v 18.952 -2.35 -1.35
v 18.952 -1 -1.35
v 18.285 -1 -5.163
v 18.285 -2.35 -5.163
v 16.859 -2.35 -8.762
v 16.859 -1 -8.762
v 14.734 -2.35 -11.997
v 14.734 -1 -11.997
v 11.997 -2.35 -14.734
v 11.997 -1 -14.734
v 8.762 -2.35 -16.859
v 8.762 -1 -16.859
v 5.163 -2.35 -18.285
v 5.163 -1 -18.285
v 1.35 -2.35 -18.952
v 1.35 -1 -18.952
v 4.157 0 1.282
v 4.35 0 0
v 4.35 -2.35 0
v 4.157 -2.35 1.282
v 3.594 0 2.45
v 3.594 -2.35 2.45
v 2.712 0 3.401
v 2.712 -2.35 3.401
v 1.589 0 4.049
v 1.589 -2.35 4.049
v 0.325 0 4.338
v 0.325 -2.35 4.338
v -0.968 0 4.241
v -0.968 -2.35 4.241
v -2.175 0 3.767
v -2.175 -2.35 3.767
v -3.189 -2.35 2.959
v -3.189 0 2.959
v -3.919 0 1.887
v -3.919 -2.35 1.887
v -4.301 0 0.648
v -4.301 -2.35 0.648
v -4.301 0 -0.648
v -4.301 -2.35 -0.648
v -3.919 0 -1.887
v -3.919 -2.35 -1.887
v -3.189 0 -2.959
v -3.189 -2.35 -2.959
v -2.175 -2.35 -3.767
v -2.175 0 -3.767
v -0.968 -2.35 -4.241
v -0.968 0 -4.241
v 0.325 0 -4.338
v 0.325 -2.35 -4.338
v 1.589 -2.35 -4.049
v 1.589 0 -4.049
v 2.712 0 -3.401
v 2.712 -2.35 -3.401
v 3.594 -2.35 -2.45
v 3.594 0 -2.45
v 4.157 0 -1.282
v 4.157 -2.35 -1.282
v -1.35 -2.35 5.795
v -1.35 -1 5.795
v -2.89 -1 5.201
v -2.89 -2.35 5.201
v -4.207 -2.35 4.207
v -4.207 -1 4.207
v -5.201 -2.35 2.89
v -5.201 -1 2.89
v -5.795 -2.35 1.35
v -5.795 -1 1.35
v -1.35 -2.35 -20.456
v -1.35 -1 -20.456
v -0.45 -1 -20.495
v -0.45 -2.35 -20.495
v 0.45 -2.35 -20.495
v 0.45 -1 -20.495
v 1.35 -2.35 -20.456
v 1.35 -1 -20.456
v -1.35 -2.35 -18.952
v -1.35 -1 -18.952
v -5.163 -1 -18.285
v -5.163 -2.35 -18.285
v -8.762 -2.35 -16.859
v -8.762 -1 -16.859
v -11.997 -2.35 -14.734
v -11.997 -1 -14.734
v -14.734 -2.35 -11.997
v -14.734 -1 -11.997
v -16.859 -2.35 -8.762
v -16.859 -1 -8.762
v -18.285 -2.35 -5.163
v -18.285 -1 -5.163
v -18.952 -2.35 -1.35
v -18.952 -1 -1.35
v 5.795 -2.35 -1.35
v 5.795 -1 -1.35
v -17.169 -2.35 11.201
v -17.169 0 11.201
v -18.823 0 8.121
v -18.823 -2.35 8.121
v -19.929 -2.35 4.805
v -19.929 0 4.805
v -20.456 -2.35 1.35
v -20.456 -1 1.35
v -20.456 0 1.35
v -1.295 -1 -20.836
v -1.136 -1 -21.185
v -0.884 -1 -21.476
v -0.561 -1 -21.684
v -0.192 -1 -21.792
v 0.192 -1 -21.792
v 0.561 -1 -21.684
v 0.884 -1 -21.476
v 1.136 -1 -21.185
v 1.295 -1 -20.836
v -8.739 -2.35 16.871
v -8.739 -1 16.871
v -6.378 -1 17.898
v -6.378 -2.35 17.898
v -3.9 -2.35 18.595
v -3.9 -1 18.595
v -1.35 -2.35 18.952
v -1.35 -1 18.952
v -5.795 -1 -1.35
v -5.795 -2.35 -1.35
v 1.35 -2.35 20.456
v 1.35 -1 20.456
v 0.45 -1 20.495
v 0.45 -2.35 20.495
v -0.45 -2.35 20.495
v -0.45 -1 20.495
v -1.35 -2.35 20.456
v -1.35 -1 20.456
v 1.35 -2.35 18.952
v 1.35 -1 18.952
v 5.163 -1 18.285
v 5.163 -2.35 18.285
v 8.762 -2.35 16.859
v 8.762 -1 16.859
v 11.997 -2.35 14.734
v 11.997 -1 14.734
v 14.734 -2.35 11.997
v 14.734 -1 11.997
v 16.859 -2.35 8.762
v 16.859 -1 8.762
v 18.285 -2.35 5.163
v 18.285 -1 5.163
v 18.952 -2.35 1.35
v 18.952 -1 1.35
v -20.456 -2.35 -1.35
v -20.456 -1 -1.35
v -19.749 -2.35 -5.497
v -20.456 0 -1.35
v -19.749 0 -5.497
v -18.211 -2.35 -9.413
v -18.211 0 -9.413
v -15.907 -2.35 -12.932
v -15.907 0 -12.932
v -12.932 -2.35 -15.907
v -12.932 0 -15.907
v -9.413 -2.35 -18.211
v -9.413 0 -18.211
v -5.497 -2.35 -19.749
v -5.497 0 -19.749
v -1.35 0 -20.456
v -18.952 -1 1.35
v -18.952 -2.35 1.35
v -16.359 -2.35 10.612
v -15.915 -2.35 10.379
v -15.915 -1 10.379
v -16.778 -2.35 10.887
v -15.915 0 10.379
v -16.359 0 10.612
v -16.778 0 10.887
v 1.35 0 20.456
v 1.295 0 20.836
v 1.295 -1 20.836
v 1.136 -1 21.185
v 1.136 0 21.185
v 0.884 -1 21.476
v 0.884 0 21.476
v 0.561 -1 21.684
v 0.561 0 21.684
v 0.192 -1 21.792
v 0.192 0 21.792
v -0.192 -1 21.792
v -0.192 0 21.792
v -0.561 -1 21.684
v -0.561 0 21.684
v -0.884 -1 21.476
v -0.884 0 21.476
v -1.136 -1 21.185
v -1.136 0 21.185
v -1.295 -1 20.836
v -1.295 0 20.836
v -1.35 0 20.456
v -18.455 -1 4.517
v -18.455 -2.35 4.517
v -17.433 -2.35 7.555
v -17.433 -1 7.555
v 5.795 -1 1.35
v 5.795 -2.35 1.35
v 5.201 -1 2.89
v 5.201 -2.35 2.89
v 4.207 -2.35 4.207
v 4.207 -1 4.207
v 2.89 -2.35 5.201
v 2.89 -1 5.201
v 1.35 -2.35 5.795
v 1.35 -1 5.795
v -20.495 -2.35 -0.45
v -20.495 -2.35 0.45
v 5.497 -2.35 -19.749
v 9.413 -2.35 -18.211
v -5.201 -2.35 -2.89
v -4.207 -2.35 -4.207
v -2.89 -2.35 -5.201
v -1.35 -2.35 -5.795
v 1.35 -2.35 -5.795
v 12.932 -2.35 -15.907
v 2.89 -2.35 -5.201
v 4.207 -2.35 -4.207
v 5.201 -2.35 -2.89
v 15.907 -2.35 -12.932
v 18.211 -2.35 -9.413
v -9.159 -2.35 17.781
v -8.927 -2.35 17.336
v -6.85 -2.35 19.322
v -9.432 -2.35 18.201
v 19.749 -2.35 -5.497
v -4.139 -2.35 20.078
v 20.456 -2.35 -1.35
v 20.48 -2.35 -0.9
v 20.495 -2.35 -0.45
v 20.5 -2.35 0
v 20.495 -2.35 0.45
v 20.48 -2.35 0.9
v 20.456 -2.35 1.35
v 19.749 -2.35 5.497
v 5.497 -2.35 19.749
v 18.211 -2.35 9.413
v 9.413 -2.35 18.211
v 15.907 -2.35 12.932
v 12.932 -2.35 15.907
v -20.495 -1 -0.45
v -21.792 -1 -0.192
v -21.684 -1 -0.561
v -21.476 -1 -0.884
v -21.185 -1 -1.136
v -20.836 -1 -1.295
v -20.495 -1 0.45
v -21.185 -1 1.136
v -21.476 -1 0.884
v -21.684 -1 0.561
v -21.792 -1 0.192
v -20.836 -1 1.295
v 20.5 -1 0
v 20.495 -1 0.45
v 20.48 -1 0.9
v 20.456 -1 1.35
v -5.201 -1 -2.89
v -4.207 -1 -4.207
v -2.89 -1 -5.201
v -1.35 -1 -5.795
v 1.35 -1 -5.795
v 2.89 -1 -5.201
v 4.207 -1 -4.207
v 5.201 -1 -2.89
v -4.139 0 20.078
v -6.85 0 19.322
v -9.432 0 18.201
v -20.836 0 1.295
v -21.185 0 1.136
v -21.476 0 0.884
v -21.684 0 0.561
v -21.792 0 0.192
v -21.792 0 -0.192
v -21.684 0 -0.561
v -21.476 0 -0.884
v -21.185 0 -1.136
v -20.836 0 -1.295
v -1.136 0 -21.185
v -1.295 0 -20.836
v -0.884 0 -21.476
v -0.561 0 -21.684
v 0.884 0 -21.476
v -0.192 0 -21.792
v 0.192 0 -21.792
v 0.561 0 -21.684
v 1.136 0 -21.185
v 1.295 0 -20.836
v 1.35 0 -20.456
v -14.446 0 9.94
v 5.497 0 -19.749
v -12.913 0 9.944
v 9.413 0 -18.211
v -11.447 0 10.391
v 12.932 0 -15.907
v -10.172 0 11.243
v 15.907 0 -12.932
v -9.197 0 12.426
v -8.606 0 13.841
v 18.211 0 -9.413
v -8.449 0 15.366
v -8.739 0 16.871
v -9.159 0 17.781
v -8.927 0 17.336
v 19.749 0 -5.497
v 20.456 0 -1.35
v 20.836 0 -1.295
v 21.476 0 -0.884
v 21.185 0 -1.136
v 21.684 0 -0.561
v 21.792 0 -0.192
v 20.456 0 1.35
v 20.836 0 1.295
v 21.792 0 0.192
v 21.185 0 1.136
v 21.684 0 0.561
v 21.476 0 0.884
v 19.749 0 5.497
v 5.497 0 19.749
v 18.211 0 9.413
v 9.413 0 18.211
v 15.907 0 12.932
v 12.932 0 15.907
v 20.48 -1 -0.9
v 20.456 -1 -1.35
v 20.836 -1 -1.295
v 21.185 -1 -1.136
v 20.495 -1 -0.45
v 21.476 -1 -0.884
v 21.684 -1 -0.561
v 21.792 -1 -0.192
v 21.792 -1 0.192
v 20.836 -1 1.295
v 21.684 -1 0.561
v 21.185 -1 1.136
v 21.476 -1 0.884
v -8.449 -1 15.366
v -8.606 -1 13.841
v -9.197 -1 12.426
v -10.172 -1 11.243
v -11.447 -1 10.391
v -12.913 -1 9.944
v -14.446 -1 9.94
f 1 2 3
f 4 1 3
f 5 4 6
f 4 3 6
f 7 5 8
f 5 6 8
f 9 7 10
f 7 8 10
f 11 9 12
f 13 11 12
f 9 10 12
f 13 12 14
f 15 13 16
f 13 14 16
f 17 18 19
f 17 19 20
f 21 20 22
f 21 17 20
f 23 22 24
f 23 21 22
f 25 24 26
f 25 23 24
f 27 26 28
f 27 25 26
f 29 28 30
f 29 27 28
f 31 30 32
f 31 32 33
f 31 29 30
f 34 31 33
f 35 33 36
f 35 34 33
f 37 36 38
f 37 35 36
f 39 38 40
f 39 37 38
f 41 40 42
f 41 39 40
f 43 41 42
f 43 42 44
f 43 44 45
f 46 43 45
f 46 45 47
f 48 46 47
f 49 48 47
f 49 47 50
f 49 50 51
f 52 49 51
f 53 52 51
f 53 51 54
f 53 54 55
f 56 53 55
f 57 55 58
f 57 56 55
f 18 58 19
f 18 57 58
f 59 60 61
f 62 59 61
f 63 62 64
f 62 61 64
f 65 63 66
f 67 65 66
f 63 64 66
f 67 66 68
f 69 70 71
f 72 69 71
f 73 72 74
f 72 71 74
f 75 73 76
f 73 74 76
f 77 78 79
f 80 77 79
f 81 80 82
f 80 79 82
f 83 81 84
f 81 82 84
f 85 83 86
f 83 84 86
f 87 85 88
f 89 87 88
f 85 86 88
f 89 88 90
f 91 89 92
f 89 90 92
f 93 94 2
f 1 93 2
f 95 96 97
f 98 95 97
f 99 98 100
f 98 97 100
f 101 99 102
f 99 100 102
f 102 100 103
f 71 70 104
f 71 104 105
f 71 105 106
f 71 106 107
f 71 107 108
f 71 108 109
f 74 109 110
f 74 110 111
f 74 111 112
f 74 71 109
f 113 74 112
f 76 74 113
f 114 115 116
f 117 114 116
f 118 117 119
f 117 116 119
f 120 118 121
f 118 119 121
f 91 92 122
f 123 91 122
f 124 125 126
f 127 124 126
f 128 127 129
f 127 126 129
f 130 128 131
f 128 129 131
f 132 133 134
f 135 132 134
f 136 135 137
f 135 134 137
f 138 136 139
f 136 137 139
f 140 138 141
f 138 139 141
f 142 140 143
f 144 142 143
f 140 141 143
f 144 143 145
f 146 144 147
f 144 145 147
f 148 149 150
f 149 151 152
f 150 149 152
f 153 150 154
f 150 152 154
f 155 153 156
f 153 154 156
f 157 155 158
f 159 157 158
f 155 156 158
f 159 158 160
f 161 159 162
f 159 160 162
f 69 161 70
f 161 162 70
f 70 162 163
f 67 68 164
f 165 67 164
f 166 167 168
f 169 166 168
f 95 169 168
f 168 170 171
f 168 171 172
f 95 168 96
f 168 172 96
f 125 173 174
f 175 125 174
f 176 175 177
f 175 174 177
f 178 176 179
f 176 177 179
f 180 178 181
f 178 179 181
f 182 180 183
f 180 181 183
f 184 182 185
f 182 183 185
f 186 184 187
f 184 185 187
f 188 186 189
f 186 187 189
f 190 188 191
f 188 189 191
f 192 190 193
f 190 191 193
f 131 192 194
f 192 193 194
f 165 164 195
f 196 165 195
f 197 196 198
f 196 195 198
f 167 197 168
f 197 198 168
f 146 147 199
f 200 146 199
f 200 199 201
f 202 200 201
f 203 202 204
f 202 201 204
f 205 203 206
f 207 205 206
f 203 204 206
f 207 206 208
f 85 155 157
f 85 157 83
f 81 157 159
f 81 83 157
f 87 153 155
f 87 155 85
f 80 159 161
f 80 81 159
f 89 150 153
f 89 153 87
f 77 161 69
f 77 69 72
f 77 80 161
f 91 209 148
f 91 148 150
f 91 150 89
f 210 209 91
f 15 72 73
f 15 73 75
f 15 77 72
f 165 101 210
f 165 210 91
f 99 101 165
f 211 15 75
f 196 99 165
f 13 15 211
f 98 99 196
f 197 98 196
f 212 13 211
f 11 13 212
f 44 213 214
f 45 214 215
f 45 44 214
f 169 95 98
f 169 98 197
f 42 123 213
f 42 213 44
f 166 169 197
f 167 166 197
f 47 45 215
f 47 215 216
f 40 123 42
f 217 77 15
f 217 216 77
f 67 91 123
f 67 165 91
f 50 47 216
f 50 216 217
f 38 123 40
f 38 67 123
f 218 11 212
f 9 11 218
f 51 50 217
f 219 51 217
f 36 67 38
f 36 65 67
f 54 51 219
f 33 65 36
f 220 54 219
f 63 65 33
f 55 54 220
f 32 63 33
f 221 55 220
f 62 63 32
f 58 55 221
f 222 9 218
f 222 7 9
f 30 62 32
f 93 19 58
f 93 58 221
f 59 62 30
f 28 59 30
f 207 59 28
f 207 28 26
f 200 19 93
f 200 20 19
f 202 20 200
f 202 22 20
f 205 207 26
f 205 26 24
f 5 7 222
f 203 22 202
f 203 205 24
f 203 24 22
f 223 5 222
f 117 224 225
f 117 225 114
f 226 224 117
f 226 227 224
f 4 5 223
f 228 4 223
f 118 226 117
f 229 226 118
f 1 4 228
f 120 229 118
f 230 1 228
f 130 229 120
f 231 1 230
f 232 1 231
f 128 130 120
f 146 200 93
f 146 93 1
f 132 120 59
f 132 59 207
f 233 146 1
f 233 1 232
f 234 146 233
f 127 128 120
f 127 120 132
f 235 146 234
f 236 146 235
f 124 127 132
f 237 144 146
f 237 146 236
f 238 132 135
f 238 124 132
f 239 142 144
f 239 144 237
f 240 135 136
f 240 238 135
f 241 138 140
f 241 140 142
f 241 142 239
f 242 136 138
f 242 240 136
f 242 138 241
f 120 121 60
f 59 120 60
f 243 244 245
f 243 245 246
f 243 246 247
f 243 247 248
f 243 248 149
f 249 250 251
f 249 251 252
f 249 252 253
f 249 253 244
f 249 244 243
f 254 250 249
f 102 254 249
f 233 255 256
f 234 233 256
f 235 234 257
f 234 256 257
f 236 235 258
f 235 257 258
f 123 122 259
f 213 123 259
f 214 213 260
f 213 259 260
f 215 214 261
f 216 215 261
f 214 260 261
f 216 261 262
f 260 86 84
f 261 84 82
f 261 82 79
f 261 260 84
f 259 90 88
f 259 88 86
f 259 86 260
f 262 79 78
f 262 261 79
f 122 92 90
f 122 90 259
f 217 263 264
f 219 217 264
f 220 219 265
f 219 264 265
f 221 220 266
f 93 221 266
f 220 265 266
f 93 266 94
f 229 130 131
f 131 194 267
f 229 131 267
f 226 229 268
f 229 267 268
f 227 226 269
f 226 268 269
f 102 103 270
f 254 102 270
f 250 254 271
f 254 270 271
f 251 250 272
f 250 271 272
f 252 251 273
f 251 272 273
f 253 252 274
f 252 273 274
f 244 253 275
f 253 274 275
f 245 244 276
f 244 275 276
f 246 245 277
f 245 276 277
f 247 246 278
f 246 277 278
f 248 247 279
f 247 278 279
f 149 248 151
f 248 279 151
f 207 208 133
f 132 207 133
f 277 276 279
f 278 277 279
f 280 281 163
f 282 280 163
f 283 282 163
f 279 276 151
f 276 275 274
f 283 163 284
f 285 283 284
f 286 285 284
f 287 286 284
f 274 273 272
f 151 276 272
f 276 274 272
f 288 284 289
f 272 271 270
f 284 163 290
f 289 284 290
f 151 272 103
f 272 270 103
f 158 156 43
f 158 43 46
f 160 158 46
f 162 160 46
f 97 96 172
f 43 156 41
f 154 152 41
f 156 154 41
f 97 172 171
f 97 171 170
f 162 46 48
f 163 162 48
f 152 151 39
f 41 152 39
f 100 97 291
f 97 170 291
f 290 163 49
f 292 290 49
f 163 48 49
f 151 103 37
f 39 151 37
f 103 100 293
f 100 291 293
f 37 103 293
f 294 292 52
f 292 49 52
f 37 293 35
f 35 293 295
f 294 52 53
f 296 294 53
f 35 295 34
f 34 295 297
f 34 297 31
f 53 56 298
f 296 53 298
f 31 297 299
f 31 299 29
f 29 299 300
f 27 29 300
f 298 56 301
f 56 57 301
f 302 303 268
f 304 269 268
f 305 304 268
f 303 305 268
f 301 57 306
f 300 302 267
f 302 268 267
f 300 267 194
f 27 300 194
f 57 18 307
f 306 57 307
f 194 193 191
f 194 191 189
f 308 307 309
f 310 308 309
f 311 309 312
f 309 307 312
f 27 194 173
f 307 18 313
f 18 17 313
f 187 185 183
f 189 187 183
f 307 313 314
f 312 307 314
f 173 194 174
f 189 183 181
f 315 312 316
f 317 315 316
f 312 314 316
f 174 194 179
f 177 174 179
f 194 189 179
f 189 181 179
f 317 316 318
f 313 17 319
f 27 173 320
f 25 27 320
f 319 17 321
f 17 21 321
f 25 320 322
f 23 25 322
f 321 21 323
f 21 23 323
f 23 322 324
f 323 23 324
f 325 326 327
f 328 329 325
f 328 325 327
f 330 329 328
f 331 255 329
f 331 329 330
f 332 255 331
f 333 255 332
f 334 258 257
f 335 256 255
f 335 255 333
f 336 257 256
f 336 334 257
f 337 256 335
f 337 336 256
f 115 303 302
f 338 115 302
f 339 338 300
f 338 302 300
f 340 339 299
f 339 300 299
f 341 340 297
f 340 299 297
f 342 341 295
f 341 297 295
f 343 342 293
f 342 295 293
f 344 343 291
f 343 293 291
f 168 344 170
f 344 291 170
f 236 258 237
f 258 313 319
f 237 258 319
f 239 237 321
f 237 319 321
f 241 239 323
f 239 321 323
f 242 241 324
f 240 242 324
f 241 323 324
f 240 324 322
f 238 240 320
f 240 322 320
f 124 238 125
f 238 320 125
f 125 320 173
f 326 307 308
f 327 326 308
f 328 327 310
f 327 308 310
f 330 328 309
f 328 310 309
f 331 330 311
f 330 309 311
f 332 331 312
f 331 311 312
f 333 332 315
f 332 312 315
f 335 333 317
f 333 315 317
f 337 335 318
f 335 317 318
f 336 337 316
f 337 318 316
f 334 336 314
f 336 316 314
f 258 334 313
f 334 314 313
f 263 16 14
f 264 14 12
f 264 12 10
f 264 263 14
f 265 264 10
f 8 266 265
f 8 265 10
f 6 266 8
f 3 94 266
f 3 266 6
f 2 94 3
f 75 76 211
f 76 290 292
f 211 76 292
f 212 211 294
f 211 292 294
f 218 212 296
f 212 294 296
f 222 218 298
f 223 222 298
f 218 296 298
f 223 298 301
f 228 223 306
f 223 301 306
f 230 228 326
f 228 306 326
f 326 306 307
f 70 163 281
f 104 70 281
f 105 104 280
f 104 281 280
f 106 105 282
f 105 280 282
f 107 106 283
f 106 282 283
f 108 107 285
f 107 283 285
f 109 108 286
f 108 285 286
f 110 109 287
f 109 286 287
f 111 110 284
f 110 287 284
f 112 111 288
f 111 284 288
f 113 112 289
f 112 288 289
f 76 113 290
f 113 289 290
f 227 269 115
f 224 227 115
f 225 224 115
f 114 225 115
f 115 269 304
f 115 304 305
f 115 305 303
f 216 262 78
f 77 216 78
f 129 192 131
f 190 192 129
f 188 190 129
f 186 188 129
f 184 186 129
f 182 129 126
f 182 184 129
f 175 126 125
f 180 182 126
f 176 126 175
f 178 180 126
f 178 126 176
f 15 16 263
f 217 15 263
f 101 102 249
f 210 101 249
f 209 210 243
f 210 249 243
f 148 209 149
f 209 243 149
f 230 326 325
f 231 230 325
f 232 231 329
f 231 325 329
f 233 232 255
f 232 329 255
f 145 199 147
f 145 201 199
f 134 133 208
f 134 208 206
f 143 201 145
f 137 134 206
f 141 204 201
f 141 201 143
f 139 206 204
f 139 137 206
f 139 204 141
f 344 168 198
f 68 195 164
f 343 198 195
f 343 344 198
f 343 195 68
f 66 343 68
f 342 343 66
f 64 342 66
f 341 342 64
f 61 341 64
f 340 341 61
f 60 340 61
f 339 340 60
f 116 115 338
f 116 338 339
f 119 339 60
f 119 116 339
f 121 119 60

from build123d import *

# Parameters (mm, degrees)
F0_R     = 4.35
F1_DEPTH = 2.35
F2_DEPTH = 1
F3_DEPTH = 25


# Not quite as in the source:
# - a feature names something its author has since deleted; it is built from what else it names


with BuildPart() as f1:
    # F0 (on Front) → F1 (new body)
    with BuildSketch(Plane.XZ):
        with BuildLine():
            ThreePointArc((18.9519787885, 1.35), (18.9879909019, 0.6754269088), (19, 0))
            ThreePointArc((19, 0), (18.9879909019, -0.6754269088), (18.9519787885, -1.35))
            ThreePointArc((18.9519787885, -1.35), (13.4350288425, -13.4350288425), (1.35, -18.9519787885))
            ThreePointArc((1.35, -18.9519787885), (0, -19), (-1.35, -18.9519787885))
            ThreePointArc((-1.35, -18.9519787885), (-13.4350288425, -13.4350288425), (-18.9519787885, -1.35))
            ThreePointArc((-18.9519787885, -1.35), (-19, 0), (-18.9519787885, 1.35))
            ThreePointArc((-18.9519787885, 1.35), (-18.0084373125, 6.0577376603), (-15.9148967645, 10.378634832))
            ThreePointArc((-15.9148967645, 10.378634832), (-16.5717114004, 10.7446905008), (-17.1694954771, 11.2008225173))
            ThreePointArc((-17.1694954771, 11.2008225173), (-19.4465872664, 6.4869286792), (-20.4555004828, 1.35))
            ThreePointArc((-20.4555004828, 1.35), (-20.5, 0), (-20.4555004828, -1.35))
            ThreePointArc((-20.4555004828, -1.35), (-14.4956890143, -14.4956890143), (-1.35, -20.4555004828))
            ThreePointArc((-1.35, -20.4555004828), (0, -20.5), (1.35, -20.4555004828))
            ThreePointArc((1.35, -20.4555004828), (14.4956890143, -14.4956890143), (20.4555004828, -1.35))
            ThreePointArc((20.4555004828, -1.35), (20.4888721004, -0.6753666055), (20.5, 0))
            ThreePointArc((20.5, 0), (20.4888721004, 0.6753666055), (20.4555004828, 1.35))
            ThreePointArc((20.4555004828, 1.35), (14.4956890143, 14.4956890143), (1.35, 20.4555004828))
            ThreePointArc((1.35, 20.4555004828), (0, 20.5), (-1.35, 20.4555004828))
            ThreePointArc((-1.35, 20.4555004828), (-5.5075668443, 19.7463087046), (-9.4320097524, 18.2012964382))
            ThreePointArc((-9.4320097524, 18.2012964382), (-9.0377919084, 17.5609883013), (-8.7390902551, 16.8709306653))
            ThreePointArc((-8.7390902551, 16.8709306653), (-5.1507403222, 18.2885175488), (-1.35, 18.9519787885))
            ThreePointArc((-1.35, 18.9519787885), (0, 19), (1.35, 18.9519787885))
            ThreePointArc((1.35, 18.9519787885), (13.4350288425, 13.4350288425), (18.9519787885, 1.35))
        make_face()
        with BuildLine():
            ThreePointArc((-1.35, -18.9519787885), (0, -19), (1.35, -18.9519787885))
            Line((1.35, -18.9519787885), (1.35, -5.7948252778))
            ThreePointArc((1.35, -5.7948252778), (0, -5.95), (-1.35, -5.7948252778))
            Line((-1.35, -5.7948252778), (-1.35, -18.9519787885))
        make_face()
        with BuildLine():
            ThreePointArc((18.9519787885, -1.35), (18.9879909019, -0.6754269088), (19, 0))
            ThreePointArc((19, 0), (18.9879909019, 0.6754269088), (18.9519787885, 1.35))
            Line((18.9519787885, 1.35), (5.7948252778, 1.35))
            ThreePointArc((5.7948252778, 1.35), (5.9110790218, 0.6794444779), (5.95, 0))
            ThreePointArc((5.95, 0), (5.9110790218, -0.6794444779), (5.7948252778, -1.35))
            Line((5.7948252778, -1.35), (18.9519787885, -1.35))
        make_face()
        with BuildLine():
            ThreePointArc((-18.9519787885, 1.35), (-19, 0), (-18.9519787885, -1.35))
            Line((-18.9519787885, -1.35), (-5.7948252778, -1.35))
            ThreePointArc((-5.7948252778, -1.35), (-5.95, 0), (-5.7948252778, 1.35))
            Line((-5.7948252778, 1.35), (-18.9519787885, 1.35))
        make_face()
        with BuildLine():
            Line((1.35, 5.7948252778), (1.35, 18.9519787885))
            ThreePointArc((1.35, 18.9519787885), (0, 19), (-1.35, 18.9519787885))
            Line((-1.35, 18.9519787885), (-1.35, 5.7948252778))
            ThreePointArc((-1.35, 5.7948252778), (0, 5.95), (1.35, 5.7948252778))
        make_face()
        with BuildLine():
            ThreePointArc((5.95, 0), (5.9110790218, 0.6794444779), (5.7948252778, 1.35))
            ThreePointArc((5.7948252778, 1.35), (4.2072853481, 4.2072853481), (1.35, 5.7948252778))
            ThreePointArc((1.35, 5.7948252778), (0, 5.95), (-1.35, 5.7948252778))
            ThreePointArc((-1.35, 5.7948252778), (-4.2072853481, 4.2072853481), (-5.7948252778, 1.35))
            ThreePointArc((-5.7948252778, 1.35), (-5.95, 0), (-5.7948252778, -1.35))
            ThreePointArc((-5.7948252778, -1.35), (-4.2072853481, -4.2072853481), (-1.35, -5.7948252778))
            ThreePointArc((-1.35, -5.7948252778), (0, -5.95), (1.35, -5.7948252778))
            ThreePointArc((1.35, -5.7948252778), (4.2072853481, -4.2072853481), (5.7948252778, -1.35))
            ThreePointArc((5.7948252778, -1.35), (5.9110790218, -0.6794444779), (5.95, 0))
        make_face()
        Circle(F0_R, mode=Mode.SUBTRACT)
    extrude(amount=F1_DEPTH)

    # F0 (on Front) → F2 (join)
    with BuildSketch(Plane.XZ):
        with BuildLine():
            Line((-1.35, 5.7948252778), (-1.35, 18.9519787885))
            ThreePointArc((-1.35, 18.9519787885), (-5.1507403222, 18.2885175488), (-8.7390902551, 16.8709306653))
            ThreePointArc((-8.7390902551, 16.8709306653), (-10.1717962693, 11.2426857548), (-15.9148967645, 10.378634832))
            ThreePointArc((-15.9148967645, 10.378634832), (-18.0084373125, 6.0577376603), (-18.9519787885, 1.35))
            Line((-18.9519787885, 1.35), (-5.7948252778, 1.35))
            ThreePointArc((-5.7948252778, 1.35), (-4.2072853481, 4.2072853481), (-1.35, 5.7948252778))
        make_face()
        with BuildLine():
            ThreePointArc((1.35, -18.9519787885), (13.4350288425, -13.4350288425), (18.9519787885, -1.35))
            Line((18.9519787885, -1.35), (5.7948252778, -1.35))
            ThreePointArc((5.7948252778, -1.35), (4.2072853481, -4.2072853481), (1.35, -5.7948252778))
            Line((1.35, -5.7948252778), (1.35, -18.9519787885))
        make_face()
        with BuildLine():
            Line((5.7948252778, 1.35), (18.9519787885, 1.35))
            ThreePointArc((18.9519787885, 1.35), (13.4350288425, 13.4350288425), (1.35, 18.9519787885))
            Line((1.35, 18.9519787885), (1.35, 5.7948252778))
            ThreePointArc((1.35, 5.7948252778), (4.2072853481, 4.2072853481), (5.7948252778, 1.35))
        make_face()
        with BuildLine():
            ThreePointArc((-18.9519787885, -1.35), (-13.4350288425, -13.4350288425), (-1.35, -18.9519787885))
            Line((-1.35, -18.9519787885), (-1.35, -5.7948252778))
            ThreePointArc((-1.35, -5.7948252778), (-4.2072853481, -4.2072853481), (-5.7948252778, -1.35))
            Line((-5.7948252778, -1.35), (-18.9519787885, -1.35))
        make_face()
        with BuildLine():
            ThreePointArc((-20.4555004828, -1.35), (-20.5, 0), (-20.4555004828, 1.35))
            ThreePointArc((-20.4555004828, 1.35), (-21.8055004828, 0), (-20.4555004828, -1.35))
        make_face()
        with BuildLine():
            ThreePointArc((1.35, -20.4555004828), (0, -20.5), (-1.35, -20.4555004828))
            ThreePointArc((-1.35, -20.4555004828), (0, -21.8055004828), (1.35, -20.4555004828))
        make_face()
        with BuildLine():
            ThreePointArc((20.4555004828, -1.35), (21.8055004828, 0), (20.4555004828, 1.35))
            ThreePointArc((20.4555004828, 1.35), (20.4888721004, 0.6753666055), (20.5, 0))
            ThreePointArc((20.5, 0), (20.4888721004, -0.6753666055), (20.4555004828, -1.35))
        make_face()
        with BuildLine():
            ThreePointArc((1.35, 20.4555004828), (0, 21.8055004828), (-1.35, 20.4555004828))
            ThreePointArc((-1.35, 20.4555004828), (0, 20.5), (1.35, 20.4555004828))
        make_face()
    extrude(amount=F2_DEPTH)

    # F0 (on Front) → F3 (cut)
    with BuildSketch(Plane.XZ):
        with BuildLine():
            ThreePointArc((18.9519787885, 1.35), (18.9879909019, 0.6754269088), (19, 0))
            ThreePointArc((19, 0), (18.9879909019, -0.6754269088), (18.9519787885, -1.35))
            ThreePointArc((18.9519787885, -1.35), (13.4350288425, -13.4350288425), (1.35, -18.9519787885))
            ThreePointArc((1.35, -18.9519787885), (0, -19), (-1.35, -18.9519787885))
            ThreePointArc((-1.35, -18.9519787885), (-13.4350288425, -13.4350288425), (-18.9519787885, -1.35))
            ThreePointArc((-18.9519787885, -1.35), (-19, 0), (-18.9519787885, 1.35))
            ThreePointArc((-18.9519787885, 1.35), (-18.0084373125, 6.0577376603), (-15.9148967645, 10.378634832))
            ThreePointArc((-15.9148967645, 10.378634832), (-16.5717114004, 10.7446905008), (-17.1694954771, 11.2008225173))
            ThreePointArc((-17.1694954771, 11.2008225173), (-19.4465872664, 6.4869286792), (-20.4555004828, 1.35))
            ThreePointArc((-20.4555004828, 1.35), (-20.5, 0), (-20.4555004828, -1.35))
            ThreePointArc((-20.4555004828, -1.35), (-14.4956890143, -14.4956890143), (-1.35, -20.4555004828))
            ThreePointArc((-1.35, -20.4555004828), (0, -20.5), (1.35, -20.4555004828))
            ThreePointArc((1.35, -20.4555004828), (14.4956890143, -14.4956890143), (20.4555004828, -1.35))
            ThreePointArc((20.4555004828, -1.35), (20.4888721004, -0.6753666055), (20.5, 0))
            ThreePointArc((20.5, 0), (20.4888721004, 0.6753666055), (20.4555004828, 1.35))
            ThreePointArc((20.4555004828, 1.35), (14.4956890143, 14.4956890143), (1.35, 20.4555004828))
            ThreePointArc((1.35, 20.4555004828), (0, 20.5), (-1.35, 20.4555004828))
            ThreePointArc((-1.35, 20.4555004828), (-5.5075668443, 19.7463087046), (-9.4320097524, 18.2012964382))
            ThreePointArc((-9.4320097524, 18.2012964382), (-9.0377919084, 17.5609883013), (-8.7390902551, 16.8709306653))
            ThreePointArc((-8.7390902551, 16.8709306653), (-5.1507403222, 18.2885175488), (-1.35, 18.9519787885))
            ThreePointArc((-1.35, 18.9519787885), (0, 19), (1.35, 18.9519787885))
            ThreePointArc((1.35, 18.9519787885), (13.4350288425, 13.4350288425), (18.9519787885, 1.35))
        make_face()
        with BuildLine():
            ThreePointArc((-15.9148967645, 10.378634832), (-12.7472446155, 14.0892780054), (-8.7390902551, 16.8709306653))
            ThreePointArc((-8.7390902551, 16.8709306653), (-9.0377919084, 17.5609883013), (-9.4320097524, 18.2012964382))
            ThreePointArc((-9.4320097524, 18.2012964382), (-13.7536060325, 15.2015894268), (-17.1694954771, 11.2008225173))
            ThreePointArc((-17.1694954771, 11.2008225173), (-16.5717114004, 10.7446905008), (-15.9148967645, 10.378634832))
        make_face()
        with BuildLine():
            ThreePointArc((1.35, 20.4555004828), (0, 21.8055004828), (-1.35, 20.4555004828))
            ThreePointArc((-1.35, 20.4555004828), (0, 20.5), (1.35, 20.4555004828))
        make_face()
        with BuildLine():
            ThreePointArc((-20.4555004828, -1.35), (-20.5, 0), (-20.4555004828, 1.35))
            ThreePointArc((-20.4555004828, 1.35), (-21.8055004828, 0), (-20.4555004828, -1.35))
        make_face()
        with BuildLine():
            ThreePointArc((20.4555004828, -1.35), (21.8055004828, 0), (20.4555004828, 1.35))
            ThreePointArc((20.4555004828, 1.35), (20.4888721004, 0.6753666055), (20.5, 0))
            ThreePointArc((20.5, 0), (20.4888721004, -0.6753666055), (20.4555004828, -1.35))
        make_face()
        with BuildLine():
            ThreePointArc((1.35, -20.4555004828), (0, -20.5), (-1.35, -20.4555004828))
            ThreePointArc((-1.35, -20.4555004828), (0, -21.8055004828), (1.35, -20.4555004828))
        make_face()
    extrude(amount=-F3_DEPTH, mode=Mode.SUBTRACT)


solid = f1.part
